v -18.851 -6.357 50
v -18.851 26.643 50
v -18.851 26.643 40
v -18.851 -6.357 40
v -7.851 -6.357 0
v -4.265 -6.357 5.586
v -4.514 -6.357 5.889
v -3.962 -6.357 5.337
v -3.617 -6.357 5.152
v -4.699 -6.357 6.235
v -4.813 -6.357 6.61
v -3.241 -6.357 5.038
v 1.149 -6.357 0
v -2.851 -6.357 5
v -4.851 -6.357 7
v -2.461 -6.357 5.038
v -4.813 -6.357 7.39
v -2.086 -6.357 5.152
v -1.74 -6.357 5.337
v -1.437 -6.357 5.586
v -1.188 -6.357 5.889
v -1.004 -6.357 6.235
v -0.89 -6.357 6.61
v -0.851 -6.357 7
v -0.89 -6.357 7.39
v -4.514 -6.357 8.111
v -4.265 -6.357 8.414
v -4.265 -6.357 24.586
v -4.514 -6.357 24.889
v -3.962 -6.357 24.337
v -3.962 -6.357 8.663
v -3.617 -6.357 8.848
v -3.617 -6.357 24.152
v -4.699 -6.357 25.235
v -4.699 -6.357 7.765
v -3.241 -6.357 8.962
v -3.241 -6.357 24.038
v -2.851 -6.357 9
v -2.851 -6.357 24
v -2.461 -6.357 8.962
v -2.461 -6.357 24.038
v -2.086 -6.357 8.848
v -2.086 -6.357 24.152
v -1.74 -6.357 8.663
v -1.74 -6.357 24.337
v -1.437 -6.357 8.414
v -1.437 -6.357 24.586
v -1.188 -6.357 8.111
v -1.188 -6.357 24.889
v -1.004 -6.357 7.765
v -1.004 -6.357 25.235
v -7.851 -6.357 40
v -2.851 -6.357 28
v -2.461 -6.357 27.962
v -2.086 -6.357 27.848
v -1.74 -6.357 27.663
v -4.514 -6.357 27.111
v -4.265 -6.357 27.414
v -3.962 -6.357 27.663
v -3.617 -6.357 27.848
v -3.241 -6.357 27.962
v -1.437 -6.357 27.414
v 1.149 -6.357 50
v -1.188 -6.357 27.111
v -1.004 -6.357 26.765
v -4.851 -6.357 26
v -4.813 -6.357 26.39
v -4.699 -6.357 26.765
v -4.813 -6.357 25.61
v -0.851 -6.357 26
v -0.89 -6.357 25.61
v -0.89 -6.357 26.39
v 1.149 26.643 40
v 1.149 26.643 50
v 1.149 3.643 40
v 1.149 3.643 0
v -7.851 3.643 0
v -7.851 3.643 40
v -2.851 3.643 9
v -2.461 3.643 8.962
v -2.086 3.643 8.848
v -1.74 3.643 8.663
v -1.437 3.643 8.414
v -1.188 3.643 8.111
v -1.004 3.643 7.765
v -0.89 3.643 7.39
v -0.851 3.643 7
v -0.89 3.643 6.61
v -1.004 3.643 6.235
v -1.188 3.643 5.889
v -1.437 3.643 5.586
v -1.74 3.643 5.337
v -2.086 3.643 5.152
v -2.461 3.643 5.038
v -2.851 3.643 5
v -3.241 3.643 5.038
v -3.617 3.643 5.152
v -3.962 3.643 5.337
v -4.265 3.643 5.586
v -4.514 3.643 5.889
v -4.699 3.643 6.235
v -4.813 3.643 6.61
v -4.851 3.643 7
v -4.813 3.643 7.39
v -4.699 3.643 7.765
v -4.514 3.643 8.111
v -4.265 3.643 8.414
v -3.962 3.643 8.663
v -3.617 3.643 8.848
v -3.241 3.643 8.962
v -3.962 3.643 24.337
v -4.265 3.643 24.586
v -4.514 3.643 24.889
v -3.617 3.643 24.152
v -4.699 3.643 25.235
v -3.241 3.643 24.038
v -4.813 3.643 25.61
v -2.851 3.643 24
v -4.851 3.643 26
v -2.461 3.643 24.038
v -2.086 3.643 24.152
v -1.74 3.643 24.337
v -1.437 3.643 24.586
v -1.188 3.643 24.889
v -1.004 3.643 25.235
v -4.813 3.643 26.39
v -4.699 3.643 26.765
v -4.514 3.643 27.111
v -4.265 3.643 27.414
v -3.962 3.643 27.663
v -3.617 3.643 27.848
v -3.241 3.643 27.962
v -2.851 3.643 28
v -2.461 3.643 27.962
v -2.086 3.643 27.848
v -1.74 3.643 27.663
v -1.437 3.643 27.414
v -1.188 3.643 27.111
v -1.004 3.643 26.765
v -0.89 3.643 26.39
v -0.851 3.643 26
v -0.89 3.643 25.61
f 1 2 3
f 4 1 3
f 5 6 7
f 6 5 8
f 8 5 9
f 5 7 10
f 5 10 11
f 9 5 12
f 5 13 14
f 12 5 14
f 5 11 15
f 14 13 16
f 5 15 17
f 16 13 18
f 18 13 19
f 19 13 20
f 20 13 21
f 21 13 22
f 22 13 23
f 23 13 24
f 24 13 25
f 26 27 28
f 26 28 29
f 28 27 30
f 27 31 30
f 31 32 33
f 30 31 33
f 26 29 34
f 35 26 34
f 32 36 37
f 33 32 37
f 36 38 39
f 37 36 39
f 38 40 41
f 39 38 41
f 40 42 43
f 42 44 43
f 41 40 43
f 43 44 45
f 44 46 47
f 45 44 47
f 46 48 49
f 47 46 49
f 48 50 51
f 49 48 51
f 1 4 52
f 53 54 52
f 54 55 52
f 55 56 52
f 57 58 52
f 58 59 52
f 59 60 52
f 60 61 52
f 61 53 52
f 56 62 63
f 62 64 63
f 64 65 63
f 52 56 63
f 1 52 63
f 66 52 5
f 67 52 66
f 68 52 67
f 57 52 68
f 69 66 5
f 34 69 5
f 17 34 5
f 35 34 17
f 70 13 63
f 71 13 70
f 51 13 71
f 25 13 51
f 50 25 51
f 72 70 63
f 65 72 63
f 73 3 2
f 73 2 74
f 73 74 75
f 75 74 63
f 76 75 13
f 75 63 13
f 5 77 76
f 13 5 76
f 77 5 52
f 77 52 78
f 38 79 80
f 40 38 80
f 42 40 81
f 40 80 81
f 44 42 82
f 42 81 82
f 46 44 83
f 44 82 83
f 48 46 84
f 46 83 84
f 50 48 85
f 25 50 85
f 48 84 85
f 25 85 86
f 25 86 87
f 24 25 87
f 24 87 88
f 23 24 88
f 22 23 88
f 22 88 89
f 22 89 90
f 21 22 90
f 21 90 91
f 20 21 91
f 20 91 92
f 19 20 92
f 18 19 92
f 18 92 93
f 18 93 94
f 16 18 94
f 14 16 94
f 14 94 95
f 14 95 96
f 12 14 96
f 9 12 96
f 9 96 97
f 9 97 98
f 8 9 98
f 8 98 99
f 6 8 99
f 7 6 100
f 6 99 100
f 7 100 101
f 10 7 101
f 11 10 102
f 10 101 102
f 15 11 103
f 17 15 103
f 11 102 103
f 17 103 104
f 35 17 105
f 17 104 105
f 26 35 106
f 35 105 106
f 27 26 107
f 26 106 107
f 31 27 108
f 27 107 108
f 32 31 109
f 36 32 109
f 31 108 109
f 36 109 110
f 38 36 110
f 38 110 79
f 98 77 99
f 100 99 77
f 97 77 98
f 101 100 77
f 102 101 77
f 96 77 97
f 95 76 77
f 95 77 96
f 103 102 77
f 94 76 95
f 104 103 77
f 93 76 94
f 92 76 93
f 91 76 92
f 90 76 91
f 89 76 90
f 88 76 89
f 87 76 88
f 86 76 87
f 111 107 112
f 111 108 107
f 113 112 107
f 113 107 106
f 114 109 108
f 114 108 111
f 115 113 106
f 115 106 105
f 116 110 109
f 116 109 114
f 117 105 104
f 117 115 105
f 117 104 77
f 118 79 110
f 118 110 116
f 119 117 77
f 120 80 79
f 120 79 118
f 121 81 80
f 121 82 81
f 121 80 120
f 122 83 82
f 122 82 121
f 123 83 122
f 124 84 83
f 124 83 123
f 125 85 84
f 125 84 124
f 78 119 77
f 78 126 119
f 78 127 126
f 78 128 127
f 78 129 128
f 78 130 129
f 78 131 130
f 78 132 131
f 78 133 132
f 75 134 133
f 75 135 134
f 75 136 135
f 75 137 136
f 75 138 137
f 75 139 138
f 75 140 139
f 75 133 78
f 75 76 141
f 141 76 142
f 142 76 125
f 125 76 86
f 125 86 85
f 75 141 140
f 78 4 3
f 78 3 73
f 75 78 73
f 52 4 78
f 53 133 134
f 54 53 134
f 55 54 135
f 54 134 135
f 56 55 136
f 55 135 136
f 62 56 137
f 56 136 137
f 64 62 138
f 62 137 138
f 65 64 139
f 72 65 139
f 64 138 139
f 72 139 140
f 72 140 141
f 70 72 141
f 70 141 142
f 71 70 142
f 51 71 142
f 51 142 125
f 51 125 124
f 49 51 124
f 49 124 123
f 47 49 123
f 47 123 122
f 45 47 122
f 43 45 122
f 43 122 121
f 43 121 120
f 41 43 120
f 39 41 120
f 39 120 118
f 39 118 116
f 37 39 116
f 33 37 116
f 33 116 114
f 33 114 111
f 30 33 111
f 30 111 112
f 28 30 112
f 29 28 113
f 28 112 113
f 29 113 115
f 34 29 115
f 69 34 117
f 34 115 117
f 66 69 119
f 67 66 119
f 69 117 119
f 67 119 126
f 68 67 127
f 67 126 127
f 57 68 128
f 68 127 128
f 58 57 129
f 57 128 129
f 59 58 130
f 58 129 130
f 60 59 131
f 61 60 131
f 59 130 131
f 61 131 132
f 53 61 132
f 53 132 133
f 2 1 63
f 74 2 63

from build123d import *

# Parameters (mm, degrees)
SKETCH1_W           = 10
SKETCH1_H           = 10
BOSS_EXTRUDE1_DEPTH = 50
SKETCH3_W           = 10
SKETCH3_H           = 10
BOSS_EXTRUDE3_DEPTH = 11
SKETCH8_W           = 20
SKETCH8_H           = 10
BOSS_EXTRUDE4_DEPTH = 23
SKETCH9_R           = 2
CUT_EXTRUDE2_DEPTH  = 23
SKETCH9_4_R         = 2
CUT_EXTRUDE3_DEPTH  = 23
SKETCH_1_W          = 50
SKETCH_1_H          = 10
CUT_EXTRUDE_1_DEPTH = 1


with BuildPart() as part:
    # Sketch1 → Boss-Extrude1 (new body)
    with BuildSketch(Plane.XY):
        with Locations((-2.851282988, -1.356707317)):
            Rectangle(SKETCH1_W, SKETCH1_H)
    extrude(amount=BOSS_EXTRUDE1_DEPTH)

    # Sketch3 → Boss-Extrude3 (add)
    with BuildSketch(Plane.ZY.offset(7.851282988)):
        with Locations((45, -1.356707317)):
            Rectangle(SKETCH3_W, SKETCH3_H)
    extrude(amount=BOSS_EXTRUDE3_DEPTH)

    # Sketch8 → Boss-Extrude4 (add)
    with BuildSketch(Plane(origin=(0, 3.643292683, 0), x_dir=(1, 0, 0), z_dir=(0, 1, 0))):
        with Locations((-8.851282988, -45)):
            Rectangle(SKETCH8_W, SKETCH8_H)
    extrude(amount=BOSS_EXTRUDE4_DEPTH)

    # Sketch9 → Cut-Extrude2 (cut)
    with BuildSketch(Plane(origin=(0, 3.643292683, 0), x_dir=(1, 0, 0), z_dir=(0, 1, 0))):
        with Locations(Location((-2.851282988, -7, 0), (0, 0, 270))):
            Circle(SKETCH9_R)
    extrude(amount=-CUT_EXTRUDE2_DEPTH, mode=Mode.SUBTRACT)

    # Sketch9<4> → Cut-Extrude3 (cut)
    with BuildSketch(Plane(origin=(0, 3.643292683, 0), x_dir=(1, 0, 0), z_dir=(0, 1, 0))):
        with Locations(Location((-2.851282988, -26, 0), (0, 0, 270))):
            Circle(SKETCH9_4_R)
    extrude(amount=-CUT_EXTRUDE3_DEPTH, mode=Mode.SUBTRACT)

    # 草图1 → 切除-拉伸1 (cut)
    with BuildSketch(Plane(origin=(2.148717012, 0, 0), x_dir=(0, 0, -1), z_dir=(1, 0, 0))):
        with Locations((-25, -1.356707317)):
            Rectangle(SKETCH_1_W, SKETCH_1_H)
    extrude(amount=-CUT_EXTRUDE_1_DEPTH, mode=Mode.SUBTRACT)


solid = part.part
